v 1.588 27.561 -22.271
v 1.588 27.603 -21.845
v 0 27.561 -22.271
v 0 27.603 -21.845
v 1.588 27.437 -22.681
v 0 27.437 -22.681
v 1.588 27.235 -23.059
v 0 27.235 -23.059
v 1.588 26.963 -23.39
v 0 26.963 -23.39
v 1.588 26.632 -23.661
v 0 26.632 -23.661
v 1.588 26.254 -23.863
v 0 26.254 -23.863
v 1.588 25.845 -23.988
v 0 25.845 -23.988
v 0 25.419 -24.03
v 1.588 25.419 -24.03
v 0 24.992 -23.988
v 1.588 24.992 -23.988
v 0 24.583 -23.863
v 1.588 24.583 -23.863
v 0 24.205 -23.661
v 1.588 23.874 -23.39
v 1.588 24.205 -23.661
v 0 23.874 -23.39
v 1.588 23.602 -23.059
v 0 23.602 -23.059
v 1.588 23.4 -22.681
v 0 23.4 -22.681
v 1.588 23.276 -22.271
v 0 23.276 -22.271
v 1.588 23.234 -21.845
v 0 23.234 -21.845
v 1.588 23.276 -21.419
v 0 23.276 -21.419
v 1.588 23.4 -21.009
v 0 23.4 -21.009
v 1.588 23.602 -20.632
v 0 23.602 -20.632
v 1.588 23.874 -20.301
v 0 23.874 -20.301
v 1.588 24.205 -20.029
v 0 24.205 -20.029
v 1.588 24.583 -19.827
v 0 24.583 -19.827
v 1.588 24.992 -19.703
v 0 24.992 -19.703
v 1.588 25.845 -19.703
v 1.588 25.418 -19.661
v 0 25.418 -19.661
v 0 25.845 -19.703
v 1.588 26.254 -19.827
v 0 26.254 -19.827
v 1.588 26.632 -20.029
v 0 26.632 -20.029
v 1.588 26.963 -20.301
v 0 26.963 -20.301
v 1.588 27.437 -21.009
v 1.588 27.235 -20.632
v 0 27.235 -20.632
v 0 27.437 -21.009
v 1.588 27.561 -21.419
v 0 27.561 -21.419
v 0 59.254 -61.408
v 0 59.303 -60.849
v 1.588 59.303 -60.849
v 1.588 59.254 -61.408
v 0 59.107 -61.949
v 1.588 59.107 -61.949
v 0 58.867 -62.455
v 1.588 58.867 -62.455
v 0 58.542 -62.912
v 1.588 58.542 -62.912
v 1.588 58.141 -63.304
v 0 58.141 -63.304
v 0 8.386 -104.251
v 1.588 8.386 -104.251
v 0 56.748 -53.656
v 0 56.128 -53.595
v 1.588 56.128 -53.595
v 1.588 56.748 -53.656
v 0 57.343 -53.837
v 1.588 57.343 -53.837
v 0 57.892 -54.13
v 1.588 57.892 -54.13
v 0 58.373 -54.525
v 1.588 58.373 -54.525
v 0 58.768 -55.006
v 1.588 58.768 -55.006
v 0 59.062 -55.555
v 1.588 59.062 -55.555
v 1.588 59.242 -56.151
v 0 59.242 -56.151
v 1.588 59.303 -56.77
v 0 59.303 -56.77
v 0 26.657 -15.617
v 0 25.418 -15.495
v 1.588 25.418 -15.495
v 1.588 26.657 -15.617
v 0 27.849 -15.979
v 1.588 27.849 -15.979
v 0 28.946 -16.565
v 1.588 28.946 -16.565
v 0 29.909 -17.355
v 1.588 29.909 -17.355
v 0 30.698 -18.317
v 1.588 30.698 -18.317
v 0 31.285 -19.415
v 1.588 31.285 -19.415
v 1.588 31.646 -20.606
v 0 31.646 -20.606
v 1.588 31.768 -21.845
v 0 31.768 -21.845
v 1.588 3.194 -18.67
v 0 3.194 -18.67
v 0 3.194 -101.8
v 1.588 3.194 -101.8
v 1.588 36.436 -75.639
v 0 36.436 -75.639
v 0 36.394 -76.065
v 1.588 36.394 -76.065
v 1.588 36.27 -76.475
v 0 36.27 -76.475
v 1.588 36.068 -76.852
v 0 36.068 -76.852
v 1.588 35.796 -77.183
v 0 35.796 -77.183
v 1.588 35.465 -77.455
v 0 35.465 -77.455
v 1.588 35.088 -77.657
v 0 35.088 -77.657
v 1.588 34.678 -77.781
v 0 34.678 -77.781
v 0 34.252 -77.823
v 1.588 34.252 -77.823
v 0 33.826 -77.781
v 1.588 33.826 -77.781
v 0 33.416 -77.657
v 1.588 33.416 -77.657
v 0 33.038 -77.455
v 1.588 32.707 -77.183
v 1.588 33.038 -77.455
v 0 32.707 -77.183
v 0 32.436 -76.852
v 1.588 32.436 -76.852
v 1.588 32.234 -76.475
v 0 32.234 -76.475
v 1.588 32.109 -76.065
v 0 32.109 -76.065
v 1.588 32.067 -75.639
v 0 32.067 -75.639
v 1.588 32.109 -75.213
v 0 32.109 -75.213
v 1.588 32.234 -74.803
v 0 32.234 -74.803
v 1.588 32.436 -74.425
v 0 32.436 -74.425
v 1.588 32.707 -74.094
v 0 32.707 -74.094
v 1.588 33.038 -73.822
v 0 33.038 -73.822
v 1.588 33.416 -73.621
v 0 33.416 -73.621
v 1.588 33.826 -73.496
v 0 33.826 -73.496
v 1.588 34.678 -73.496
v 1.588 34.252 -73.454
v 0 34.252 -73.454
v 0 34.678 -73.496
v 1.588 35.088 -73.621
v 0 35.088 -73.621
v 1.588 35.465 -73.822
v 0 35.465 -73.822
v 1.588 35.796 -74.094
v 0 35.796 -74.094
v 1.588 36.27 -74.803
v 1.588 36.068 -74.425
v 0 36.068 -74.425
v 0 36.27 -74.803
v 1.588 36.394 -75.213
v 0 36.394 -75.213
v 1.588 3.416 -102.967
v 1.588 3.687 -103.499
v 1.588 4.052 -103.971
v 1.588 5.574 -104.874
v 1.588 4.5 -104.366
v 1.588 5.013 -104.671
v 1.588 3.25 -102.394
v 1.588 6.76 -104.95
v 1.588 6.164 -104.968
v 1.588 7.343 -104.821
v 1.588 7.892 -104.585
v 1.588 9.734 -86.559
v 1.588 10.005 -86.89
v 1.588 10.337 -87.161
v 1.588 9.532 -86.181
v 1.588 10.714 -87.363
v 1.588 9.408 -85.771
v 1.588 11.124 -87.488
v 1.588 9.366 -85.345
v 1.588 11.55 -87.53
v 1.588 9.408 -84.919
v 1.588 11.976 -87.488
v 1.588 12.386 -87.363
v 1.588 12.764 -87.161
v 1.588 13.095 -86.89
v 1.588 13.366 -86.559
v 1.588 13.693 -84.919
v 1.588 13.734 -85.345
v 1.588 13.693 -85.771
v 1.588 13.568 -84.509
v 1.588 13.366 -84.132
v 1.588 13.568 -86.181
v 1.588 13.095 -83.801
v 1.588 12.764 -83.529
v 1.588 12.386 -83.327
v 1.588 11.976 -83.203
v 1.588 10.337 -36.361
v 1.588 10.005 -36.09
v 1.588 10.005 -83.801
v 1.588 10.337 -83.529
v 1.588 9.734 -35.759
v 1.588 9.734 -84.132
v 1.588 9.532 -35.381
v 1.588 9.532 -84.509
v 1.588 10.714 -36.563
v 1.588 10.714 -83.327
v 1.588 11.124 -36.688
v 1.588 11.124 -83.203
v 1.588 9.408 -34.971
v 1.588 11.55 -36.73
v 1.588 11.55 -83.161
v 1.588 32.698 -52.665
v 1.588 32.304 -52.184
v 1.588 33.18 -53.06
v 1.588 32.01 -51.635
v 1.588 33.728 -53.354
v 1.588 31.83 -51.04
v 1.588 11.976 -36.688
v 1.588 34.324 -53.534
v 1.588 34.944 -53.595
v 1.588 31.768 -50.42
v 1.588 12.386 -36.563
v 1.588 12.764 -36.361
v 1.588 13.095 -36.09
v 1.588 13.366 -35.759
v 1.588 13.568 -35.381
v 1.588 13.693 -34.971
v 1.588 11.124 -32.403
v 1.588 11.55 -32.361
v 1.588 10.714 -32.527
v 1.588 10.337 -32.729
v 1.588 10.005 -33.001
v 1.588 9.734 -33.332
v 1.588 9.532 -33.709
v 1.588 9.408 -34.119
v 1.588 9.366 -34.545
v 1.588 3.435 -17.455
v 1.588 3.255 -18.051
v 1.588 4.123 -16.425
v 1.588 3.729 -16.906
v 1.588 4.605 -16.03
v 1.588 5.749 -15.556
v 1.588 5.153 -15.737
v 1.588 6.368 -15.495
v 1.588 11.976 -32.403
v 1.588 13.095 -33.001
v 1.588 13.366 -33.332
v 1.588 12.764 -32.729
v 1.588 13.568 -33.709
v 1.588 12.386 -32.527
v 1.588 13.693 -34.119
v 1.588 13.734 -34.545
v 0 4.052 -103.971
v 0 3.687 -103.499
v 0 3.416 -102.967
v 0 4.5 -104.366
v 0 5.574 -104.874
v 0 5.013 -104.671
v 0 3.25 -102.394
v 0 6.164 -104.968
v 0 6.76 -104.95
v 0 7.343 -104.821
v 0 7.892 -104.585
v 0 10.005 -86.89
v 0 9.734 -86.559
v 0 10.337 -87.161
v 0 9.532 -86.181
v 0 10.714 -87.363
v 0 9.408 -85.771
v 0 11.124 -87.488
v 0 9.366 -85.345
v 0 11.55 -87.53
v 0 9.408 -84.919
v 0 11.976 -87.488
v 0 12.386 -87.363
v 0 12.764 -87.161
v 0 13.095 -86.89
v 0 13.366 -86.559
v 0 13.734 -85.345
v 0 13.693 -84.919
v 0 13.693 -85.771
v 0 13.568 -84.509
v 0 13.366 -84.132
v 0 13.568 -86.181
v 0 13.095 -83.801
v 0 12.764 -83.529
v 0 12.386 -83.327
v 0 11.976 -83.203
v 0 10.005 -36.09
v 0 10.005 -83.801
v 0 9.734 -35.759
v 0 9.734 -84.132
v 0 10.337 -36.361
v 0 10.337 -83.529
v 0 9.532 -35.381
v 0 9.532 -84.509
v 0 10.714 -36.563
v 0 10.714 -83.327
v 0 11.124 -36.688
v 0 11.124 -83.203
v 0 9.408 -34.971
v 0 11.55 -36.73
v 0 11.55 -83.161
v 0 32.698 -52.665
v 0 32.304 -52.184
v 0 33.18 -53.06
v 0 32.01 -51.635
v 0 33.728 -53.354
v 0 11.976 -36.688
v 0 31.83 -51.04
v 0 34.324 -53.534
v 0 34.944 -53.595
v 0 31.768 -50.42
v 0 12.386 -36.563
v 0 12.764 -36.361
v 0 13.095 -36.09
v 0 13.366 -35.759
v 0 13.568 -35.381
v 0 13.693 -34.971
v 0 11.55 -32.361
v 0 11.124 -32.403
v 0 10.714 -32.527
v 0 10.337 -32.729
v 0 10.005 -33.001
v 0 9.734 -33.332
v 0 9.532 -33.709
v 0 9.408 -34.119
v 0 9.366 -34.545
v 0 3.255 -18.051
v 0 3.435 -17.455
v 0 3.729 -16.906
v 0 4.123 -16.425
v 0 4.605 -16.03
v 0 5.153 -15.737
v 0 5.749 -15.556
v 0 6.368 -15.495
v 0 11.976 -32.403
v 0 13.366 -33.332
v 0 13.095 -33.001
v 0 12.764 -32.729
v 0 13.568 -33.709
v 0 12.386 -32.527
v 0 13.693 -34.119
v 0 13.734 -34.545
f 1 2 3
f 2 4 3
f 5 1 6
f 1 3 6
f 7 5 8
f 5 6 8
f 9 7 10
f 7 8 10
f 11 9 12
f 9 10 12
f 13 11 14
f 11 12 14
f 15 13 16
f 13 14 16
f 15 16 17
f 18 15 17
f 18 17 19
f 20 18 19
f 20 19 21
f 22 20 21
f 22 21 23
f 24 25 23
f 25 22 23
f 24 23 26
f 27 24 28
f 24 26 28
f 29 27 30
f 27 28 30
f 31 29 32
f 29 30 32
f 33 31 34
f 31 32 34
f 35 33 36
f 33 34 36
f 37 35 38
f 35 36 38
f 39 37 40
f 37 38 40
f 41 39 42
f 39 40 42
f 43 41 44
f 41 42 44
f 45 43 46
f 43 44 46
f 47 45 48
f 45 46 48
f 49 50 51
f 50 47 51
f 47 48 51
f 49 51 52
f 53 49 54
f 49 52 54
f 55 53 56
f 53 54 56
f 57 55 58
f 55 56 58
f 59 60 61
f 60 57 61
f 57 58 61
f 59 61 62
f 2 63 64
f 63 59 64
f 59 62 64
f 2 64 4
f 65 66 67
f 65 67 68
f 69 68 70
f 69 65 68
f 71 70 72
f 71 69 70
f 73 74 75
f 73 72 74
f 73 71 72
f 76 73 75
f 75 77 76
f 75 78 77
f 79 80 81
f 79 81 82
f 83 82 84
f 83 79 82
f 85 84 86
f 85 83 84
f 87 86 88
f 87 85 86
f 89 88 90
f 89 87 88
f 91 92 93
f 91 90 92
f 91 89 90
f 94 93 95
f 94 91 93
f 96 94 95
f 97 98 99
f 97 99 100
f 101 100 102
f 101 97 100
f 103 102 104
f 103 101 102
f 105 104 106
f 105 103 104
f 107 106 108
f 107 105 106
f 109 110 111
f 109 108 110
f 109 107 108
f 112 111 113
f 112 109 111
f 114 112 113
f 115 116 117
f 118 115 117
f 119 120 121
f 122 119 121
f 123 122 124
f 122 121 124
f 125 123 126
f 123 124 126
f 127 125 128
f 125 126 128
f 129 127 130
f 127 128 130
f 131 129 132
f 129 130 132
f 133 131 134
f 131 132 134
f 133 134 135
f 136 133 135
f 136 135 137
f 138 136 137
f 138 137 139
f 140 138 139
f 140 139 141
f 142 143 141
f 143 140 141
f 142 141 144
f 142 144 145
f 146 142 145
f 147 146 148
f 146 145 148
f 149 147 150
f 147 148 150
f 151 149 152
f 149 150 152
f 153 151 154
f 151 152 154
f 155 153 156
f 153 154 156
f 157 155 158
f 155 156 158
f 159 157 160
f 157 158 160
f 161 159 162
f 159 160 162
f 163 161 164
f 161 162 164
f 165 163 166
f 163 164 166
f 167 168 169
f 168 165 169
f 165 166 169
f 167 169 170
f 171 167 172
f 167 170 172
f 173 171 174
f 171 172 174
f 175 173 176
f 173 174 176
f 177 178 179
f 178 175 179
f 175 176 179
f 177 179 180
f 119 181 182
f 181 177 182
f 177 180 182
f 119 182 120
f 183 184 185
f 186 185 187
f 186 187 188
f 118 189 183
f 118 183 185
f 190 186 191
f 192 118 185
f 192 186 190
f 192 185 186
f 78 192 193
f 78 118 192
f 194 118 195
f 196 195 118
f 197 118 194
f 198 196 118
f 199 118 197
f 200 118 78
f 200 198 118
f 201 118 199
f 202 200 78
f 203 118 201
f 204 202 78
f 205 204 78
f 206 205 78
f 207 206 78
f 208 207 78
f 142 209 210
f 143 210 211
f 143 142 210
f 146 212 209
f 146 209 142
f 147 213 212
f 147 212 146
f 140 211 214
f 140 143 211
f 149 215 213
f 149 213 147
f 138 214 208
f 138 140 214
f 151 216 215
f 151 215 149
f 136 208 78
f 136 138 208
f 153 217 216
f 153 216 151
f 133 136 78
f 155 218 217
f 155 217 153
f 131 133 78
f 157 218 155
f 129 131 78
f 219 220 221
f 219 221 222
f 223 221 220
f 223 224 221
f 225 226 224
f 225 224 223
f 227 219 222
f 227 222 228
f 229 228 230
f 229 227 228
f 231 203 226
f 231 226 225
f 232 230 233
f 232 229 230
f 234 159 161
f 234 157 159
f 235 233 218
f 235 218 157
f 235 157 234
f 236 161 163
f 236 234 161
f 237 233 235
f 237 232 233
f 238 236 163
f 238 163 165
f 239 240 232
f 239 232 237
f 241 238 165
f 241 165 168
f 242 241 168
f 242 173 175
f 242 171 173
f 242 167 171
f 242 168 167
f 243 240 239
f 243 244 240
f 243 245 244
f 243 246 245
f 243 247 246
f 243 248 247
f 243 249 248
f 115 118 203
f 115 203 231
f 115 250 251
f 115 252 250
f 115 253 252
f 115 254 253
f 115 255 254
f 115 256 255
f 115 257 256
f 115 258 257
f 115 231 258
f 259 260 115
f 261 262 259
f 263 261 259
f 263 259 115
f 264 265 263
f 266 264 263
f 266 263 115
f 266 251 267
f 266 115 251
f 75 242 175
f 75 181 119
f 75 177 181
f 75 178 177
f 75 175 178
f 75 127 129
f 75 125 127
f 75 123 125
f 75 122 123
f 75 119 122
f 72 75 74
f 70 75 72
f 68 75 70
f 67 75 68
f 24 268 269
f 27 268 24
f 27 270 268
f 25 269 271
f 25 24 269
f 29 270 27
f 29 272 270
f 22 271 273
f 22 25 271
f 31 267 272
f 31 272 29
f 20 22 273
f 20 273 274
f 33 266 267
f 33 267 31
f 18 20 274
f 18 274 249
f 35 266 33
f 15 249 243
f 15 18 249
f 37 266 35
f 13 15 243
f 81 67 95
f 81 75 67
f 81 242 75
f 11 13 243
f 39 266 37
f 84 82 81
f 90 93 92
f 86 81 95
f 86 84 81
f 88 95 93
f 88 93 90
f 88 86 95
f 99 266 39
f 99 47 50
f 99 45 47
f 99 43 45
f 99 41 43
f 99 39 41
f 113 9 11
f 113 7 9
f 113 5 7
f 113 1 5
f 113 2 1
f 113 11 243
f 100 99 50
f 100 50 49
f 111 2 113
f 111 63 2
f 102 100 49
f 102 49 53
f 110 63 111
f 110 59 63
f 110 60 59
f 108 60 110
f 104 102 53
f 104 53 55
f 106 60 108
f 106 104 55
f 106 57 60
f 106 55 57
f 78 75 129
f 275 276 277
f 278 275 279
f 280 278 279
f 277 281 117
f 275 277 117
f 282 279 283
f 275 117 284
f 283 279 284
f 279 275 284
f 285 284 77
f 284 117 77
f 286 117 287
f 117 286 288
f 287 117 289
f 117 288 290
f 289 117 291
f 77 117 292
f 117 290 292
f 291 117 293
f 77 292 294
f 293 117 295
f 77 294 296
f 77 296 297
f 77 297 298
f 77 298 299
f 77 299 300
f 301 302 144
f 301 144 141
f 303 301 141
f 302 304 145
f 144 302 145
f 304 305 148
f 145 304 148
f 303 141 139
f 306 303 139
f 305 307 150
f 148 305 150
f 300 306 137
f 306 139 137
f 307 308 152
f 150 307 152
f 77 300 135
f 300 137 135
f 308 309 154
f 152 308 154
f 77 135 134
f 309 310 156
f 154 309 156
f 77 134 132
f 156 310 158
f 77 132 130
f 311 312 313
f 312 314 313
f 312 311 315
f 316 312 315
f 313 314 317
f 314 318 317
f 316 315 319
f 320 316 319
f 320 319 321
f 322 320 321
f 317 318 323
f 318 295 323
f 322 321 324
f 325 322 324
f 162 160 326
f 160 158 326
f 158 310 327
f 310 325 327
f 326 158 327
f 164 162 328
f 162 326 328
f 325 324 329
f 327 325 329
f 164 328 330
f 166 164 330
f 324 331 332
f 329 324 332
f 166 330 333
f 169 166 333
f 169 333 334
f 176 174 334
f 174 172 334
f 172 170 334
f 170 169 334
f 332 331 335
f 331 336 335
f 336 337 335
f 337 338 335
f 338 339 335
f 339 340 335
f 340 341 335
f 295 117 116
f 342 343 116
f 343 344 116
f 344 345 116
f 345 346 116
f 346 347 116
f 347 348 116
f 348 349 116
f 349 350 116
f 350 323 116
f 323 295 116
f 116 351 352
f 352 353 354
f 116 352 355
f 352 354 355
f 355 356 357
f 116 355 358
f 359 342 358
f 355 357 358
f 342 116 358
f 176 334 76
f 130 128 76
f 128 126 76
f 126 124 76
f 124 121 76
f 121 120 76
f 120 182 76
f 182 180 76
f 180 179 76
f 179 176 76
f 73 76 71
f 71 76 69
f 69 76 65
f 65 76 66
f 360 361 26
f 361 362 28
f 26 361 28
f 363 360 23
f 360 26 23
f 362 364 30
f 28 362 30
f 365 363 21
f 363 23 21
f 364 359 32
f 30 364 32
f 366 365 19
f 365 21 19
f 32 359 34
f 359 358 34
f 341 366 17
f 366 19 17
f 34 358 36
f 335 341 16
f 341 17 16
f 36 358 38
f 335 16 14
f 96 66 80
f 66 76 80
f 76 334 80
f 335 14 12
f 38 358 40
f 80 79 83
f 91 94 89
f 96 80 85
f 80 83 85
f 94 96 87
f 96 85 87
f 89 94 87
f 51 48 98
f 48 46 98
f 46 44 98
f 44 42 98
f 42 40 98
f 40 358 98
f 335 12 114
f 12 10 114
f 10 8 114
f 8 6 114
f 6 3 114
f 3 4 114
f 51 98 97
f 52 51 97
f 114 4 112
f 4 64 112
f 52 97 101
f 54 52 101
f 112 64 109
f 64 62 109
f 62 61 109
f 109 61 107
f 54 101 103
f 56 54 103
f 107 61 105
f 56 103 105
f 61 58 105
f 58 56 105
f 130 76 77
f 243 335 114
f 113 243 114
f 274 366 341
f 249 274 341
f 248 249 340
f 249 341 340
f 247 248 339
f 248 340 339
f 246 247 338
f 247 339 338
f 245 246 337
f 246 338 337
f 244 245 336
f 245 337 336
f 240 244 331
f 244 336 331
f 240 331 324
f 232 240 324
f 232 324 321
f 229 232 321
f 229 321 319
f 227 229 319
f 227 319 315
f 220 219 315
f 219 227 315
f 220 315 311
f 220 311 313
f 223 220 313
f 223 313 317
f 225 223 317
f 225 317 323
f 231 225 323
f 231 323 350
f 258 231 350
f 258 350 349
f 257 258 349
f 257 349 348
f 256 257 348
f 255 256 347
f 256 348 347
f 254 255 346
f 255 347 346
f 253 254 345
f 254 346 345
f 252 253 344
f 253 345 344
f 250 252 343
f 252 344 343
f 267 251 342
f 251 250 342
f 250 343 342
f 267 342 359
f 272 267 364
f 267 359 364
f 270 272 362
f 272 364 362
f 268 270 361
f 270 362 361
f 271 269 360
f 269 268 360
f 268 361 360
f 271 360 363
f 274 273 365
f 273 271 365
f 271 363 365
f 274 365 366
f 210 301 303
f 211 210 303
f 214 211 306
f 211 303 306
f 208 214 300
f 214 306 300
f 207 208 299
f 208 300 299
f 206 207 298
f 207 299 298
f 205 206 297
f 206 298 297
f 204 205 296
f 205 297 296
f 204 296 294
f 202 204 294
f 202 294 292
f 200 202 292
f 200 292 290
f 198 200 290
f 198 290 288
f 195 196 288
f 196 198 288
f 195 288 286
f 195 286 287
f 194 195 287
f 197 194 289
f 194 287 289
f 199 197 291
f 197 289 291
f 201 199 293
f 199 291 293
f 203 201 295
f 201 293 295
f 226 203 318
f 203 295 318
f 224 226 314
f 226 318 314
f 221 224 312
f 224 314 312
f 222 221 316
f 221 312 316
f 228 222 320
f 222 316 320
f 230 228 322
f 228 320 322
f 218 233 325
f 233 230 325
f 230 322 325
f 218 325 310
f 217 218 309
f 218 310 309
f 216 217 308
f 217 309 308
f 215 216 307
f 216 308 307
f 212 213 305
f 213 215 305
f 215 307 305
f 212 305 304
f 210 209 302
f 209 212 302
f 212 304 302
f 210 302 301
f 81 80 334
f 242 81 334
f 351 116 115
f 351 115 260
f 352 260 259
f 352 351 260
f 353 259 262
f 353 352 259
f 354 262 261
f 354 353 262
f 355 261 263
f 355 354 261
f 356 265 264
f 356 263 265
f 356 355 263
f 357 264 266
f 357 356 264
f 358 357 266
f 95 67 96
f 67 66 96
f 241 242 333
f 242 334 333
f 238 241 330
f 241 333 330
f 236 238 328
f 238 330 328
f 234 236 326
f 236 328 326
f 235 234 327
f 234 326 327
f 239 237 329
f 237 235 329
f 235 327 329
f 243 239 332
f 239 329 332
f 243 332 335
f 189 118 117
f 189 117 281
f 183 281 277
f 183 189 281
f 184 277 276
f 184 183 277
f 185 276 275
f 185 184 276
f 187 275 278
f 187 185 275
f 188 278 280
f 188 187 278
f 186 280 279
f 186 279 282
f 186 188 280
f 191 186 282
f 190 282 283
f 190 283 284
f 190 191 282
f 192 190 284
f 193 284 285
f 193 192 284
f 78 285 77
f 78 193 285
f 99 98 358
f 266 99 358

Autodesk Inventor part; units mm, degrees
ref_plane "YZ Plane" through (0, 0, 0) normal (1, 0, 0) x (0, 1, 0)
ref_plane "XZ Plane" through (0, 0, 0) normal (0, 1, 0) x (-1, 0, 0)
ref_plane "XY Plane" through (0, 0, 0) normal (0, 0, 1) x (1, 0, 0)
sketch "Sketch1" plane through (0, 0, 0) normal (1, 0, 0) x (0, 1, 0)
  line L0 (3.1935, -18.6702) -> (3.1935, -95.8243)
  arc A0 (3.1935, -95.8243) -> (7.9971, -98.5498) centre (6.3685, -95.8243) ccw
  arc A1 (7.9971, -98.5498) -> (58.1414, -63.3045) centre (-204.4103, 256.9406) ccw
  arc A2 (58.1414, -63.3045) -> (59.3034, -60.8492) centre (56.1284, -60.8492) ccw
  line L1 (59.3034, -60.8492) -> (59.3034, -56.7702)
  arc A3 (59.3034, -56.7702) -> (56.1284, -53.5952) centre (56.1284, -56.7702) ccw
  line L2 (56.1284, -53.5952) -> (34.9435, -53.5952)
  arc A4 (31.7685, -50.4202) -> (34.9435, -53.5952) centre (34.9435, -50.4202) ccw
  line L3 (31.7685, -50.4202) -> (31.7685, -21.8452)
  arc A5 (31.7685, -21.8452) -> (25.4185, -15.4952) centre (25.4185, -21.8452) ccw
  line L4 (25.4185, -15.4952) -> (6.3685, -15.4952)
  arc A6 (6.3685, -15.4952) -> (3.1935, -18.6702) centre (6.3685, -18.6702) ccw
  circle A7 centre (11.5501, -34.5452) radius 2.1844
  circle A8 centre (11.5501, -85.3452) radius 2.1844
  circle A9 centre (34.2518, -75.6387) radius 2.1844
  circle A10 centre (25.4185, -21.8452) radius 2.1844
  point P0 (0, 0)
  point P1 (25.4185, -15.4952)
  point P2 (3.1935, -18.6702)
  point P3 (7.9971, -98.5498)
  point P4 (58.1414, -63.3045)
  point P5 (34.9435, -53.5952)
sketch "Sketch2" plane through (1.5875, 0, 0) normal (1, 0, 0) x (0, 0, -1)
  line L0 (18.6702, 3.1935) -> (95.8243, 3.1935)
  line L1 (95.8243, 3.1935) -> (101.7995, 3.1935)
  arc A0 (63.3045, 58.1414) -> (60.8492, 59.3034) centre (60.8492, 56.1284) ccw
  line L2 (104.251, 8.3861) -> (63.3045, 58.1414)
  arc A1 (101.7995, 3.1935) -> (104.251, 8.3861) centre (101.7995, 6.3685) ccw
  arc A2 (98.5498, 7.9971) -> (63.3045, 58.1414) centre (-256.9406, -204.4103) ccw
  arc A3 (95.8243, 3.1935) -> (98.5498, 7.9971) centre (95.8243, 6.3685) ccw
  point P0 (0, 0)
  point P1 (108.5243, 3.1935)
  dimension "d1" = 12.7
  dimension "d2" = 3.175
extrude "Plate1" add sketch "Sketch1" along normal blind 1.5875
sheet face with bend "Face2" sketch "Sketch2" thickness 1.5875 toward (-1, 0, 0) bend radius 1.5875
bend "Bend1"
equation "\"d0\" = Thickness"
equation "\"d3\" = BendRadius"
equation "\"d4\" = BendReliefWidth"
equation "\"d6\" = MinimumRemnant"
equation "\"d5\" = BendReliefDepth"
equation "\"d7\" = TransitionRadius"
equation "\"BendRadius\" = Thickness"
equation "\"BendReliefWidth\" = Thickness"
equation "\"BendReliefDepth\" = 0.5 * Thickness"
equation "\"CornerReliefSize\" = 4 * Thickness"
equation "\"MinimumRemnant\" = 2 * Thickness"
equation "\"TransitionRadius\" = BendRadius"
equation "\"JacobiRadiusSize\" = BendRadius"
equation "\"GapSize\" = Thickness"
equation "\"Thickness\" = 1.5875"
properties part number "sledsv3"
